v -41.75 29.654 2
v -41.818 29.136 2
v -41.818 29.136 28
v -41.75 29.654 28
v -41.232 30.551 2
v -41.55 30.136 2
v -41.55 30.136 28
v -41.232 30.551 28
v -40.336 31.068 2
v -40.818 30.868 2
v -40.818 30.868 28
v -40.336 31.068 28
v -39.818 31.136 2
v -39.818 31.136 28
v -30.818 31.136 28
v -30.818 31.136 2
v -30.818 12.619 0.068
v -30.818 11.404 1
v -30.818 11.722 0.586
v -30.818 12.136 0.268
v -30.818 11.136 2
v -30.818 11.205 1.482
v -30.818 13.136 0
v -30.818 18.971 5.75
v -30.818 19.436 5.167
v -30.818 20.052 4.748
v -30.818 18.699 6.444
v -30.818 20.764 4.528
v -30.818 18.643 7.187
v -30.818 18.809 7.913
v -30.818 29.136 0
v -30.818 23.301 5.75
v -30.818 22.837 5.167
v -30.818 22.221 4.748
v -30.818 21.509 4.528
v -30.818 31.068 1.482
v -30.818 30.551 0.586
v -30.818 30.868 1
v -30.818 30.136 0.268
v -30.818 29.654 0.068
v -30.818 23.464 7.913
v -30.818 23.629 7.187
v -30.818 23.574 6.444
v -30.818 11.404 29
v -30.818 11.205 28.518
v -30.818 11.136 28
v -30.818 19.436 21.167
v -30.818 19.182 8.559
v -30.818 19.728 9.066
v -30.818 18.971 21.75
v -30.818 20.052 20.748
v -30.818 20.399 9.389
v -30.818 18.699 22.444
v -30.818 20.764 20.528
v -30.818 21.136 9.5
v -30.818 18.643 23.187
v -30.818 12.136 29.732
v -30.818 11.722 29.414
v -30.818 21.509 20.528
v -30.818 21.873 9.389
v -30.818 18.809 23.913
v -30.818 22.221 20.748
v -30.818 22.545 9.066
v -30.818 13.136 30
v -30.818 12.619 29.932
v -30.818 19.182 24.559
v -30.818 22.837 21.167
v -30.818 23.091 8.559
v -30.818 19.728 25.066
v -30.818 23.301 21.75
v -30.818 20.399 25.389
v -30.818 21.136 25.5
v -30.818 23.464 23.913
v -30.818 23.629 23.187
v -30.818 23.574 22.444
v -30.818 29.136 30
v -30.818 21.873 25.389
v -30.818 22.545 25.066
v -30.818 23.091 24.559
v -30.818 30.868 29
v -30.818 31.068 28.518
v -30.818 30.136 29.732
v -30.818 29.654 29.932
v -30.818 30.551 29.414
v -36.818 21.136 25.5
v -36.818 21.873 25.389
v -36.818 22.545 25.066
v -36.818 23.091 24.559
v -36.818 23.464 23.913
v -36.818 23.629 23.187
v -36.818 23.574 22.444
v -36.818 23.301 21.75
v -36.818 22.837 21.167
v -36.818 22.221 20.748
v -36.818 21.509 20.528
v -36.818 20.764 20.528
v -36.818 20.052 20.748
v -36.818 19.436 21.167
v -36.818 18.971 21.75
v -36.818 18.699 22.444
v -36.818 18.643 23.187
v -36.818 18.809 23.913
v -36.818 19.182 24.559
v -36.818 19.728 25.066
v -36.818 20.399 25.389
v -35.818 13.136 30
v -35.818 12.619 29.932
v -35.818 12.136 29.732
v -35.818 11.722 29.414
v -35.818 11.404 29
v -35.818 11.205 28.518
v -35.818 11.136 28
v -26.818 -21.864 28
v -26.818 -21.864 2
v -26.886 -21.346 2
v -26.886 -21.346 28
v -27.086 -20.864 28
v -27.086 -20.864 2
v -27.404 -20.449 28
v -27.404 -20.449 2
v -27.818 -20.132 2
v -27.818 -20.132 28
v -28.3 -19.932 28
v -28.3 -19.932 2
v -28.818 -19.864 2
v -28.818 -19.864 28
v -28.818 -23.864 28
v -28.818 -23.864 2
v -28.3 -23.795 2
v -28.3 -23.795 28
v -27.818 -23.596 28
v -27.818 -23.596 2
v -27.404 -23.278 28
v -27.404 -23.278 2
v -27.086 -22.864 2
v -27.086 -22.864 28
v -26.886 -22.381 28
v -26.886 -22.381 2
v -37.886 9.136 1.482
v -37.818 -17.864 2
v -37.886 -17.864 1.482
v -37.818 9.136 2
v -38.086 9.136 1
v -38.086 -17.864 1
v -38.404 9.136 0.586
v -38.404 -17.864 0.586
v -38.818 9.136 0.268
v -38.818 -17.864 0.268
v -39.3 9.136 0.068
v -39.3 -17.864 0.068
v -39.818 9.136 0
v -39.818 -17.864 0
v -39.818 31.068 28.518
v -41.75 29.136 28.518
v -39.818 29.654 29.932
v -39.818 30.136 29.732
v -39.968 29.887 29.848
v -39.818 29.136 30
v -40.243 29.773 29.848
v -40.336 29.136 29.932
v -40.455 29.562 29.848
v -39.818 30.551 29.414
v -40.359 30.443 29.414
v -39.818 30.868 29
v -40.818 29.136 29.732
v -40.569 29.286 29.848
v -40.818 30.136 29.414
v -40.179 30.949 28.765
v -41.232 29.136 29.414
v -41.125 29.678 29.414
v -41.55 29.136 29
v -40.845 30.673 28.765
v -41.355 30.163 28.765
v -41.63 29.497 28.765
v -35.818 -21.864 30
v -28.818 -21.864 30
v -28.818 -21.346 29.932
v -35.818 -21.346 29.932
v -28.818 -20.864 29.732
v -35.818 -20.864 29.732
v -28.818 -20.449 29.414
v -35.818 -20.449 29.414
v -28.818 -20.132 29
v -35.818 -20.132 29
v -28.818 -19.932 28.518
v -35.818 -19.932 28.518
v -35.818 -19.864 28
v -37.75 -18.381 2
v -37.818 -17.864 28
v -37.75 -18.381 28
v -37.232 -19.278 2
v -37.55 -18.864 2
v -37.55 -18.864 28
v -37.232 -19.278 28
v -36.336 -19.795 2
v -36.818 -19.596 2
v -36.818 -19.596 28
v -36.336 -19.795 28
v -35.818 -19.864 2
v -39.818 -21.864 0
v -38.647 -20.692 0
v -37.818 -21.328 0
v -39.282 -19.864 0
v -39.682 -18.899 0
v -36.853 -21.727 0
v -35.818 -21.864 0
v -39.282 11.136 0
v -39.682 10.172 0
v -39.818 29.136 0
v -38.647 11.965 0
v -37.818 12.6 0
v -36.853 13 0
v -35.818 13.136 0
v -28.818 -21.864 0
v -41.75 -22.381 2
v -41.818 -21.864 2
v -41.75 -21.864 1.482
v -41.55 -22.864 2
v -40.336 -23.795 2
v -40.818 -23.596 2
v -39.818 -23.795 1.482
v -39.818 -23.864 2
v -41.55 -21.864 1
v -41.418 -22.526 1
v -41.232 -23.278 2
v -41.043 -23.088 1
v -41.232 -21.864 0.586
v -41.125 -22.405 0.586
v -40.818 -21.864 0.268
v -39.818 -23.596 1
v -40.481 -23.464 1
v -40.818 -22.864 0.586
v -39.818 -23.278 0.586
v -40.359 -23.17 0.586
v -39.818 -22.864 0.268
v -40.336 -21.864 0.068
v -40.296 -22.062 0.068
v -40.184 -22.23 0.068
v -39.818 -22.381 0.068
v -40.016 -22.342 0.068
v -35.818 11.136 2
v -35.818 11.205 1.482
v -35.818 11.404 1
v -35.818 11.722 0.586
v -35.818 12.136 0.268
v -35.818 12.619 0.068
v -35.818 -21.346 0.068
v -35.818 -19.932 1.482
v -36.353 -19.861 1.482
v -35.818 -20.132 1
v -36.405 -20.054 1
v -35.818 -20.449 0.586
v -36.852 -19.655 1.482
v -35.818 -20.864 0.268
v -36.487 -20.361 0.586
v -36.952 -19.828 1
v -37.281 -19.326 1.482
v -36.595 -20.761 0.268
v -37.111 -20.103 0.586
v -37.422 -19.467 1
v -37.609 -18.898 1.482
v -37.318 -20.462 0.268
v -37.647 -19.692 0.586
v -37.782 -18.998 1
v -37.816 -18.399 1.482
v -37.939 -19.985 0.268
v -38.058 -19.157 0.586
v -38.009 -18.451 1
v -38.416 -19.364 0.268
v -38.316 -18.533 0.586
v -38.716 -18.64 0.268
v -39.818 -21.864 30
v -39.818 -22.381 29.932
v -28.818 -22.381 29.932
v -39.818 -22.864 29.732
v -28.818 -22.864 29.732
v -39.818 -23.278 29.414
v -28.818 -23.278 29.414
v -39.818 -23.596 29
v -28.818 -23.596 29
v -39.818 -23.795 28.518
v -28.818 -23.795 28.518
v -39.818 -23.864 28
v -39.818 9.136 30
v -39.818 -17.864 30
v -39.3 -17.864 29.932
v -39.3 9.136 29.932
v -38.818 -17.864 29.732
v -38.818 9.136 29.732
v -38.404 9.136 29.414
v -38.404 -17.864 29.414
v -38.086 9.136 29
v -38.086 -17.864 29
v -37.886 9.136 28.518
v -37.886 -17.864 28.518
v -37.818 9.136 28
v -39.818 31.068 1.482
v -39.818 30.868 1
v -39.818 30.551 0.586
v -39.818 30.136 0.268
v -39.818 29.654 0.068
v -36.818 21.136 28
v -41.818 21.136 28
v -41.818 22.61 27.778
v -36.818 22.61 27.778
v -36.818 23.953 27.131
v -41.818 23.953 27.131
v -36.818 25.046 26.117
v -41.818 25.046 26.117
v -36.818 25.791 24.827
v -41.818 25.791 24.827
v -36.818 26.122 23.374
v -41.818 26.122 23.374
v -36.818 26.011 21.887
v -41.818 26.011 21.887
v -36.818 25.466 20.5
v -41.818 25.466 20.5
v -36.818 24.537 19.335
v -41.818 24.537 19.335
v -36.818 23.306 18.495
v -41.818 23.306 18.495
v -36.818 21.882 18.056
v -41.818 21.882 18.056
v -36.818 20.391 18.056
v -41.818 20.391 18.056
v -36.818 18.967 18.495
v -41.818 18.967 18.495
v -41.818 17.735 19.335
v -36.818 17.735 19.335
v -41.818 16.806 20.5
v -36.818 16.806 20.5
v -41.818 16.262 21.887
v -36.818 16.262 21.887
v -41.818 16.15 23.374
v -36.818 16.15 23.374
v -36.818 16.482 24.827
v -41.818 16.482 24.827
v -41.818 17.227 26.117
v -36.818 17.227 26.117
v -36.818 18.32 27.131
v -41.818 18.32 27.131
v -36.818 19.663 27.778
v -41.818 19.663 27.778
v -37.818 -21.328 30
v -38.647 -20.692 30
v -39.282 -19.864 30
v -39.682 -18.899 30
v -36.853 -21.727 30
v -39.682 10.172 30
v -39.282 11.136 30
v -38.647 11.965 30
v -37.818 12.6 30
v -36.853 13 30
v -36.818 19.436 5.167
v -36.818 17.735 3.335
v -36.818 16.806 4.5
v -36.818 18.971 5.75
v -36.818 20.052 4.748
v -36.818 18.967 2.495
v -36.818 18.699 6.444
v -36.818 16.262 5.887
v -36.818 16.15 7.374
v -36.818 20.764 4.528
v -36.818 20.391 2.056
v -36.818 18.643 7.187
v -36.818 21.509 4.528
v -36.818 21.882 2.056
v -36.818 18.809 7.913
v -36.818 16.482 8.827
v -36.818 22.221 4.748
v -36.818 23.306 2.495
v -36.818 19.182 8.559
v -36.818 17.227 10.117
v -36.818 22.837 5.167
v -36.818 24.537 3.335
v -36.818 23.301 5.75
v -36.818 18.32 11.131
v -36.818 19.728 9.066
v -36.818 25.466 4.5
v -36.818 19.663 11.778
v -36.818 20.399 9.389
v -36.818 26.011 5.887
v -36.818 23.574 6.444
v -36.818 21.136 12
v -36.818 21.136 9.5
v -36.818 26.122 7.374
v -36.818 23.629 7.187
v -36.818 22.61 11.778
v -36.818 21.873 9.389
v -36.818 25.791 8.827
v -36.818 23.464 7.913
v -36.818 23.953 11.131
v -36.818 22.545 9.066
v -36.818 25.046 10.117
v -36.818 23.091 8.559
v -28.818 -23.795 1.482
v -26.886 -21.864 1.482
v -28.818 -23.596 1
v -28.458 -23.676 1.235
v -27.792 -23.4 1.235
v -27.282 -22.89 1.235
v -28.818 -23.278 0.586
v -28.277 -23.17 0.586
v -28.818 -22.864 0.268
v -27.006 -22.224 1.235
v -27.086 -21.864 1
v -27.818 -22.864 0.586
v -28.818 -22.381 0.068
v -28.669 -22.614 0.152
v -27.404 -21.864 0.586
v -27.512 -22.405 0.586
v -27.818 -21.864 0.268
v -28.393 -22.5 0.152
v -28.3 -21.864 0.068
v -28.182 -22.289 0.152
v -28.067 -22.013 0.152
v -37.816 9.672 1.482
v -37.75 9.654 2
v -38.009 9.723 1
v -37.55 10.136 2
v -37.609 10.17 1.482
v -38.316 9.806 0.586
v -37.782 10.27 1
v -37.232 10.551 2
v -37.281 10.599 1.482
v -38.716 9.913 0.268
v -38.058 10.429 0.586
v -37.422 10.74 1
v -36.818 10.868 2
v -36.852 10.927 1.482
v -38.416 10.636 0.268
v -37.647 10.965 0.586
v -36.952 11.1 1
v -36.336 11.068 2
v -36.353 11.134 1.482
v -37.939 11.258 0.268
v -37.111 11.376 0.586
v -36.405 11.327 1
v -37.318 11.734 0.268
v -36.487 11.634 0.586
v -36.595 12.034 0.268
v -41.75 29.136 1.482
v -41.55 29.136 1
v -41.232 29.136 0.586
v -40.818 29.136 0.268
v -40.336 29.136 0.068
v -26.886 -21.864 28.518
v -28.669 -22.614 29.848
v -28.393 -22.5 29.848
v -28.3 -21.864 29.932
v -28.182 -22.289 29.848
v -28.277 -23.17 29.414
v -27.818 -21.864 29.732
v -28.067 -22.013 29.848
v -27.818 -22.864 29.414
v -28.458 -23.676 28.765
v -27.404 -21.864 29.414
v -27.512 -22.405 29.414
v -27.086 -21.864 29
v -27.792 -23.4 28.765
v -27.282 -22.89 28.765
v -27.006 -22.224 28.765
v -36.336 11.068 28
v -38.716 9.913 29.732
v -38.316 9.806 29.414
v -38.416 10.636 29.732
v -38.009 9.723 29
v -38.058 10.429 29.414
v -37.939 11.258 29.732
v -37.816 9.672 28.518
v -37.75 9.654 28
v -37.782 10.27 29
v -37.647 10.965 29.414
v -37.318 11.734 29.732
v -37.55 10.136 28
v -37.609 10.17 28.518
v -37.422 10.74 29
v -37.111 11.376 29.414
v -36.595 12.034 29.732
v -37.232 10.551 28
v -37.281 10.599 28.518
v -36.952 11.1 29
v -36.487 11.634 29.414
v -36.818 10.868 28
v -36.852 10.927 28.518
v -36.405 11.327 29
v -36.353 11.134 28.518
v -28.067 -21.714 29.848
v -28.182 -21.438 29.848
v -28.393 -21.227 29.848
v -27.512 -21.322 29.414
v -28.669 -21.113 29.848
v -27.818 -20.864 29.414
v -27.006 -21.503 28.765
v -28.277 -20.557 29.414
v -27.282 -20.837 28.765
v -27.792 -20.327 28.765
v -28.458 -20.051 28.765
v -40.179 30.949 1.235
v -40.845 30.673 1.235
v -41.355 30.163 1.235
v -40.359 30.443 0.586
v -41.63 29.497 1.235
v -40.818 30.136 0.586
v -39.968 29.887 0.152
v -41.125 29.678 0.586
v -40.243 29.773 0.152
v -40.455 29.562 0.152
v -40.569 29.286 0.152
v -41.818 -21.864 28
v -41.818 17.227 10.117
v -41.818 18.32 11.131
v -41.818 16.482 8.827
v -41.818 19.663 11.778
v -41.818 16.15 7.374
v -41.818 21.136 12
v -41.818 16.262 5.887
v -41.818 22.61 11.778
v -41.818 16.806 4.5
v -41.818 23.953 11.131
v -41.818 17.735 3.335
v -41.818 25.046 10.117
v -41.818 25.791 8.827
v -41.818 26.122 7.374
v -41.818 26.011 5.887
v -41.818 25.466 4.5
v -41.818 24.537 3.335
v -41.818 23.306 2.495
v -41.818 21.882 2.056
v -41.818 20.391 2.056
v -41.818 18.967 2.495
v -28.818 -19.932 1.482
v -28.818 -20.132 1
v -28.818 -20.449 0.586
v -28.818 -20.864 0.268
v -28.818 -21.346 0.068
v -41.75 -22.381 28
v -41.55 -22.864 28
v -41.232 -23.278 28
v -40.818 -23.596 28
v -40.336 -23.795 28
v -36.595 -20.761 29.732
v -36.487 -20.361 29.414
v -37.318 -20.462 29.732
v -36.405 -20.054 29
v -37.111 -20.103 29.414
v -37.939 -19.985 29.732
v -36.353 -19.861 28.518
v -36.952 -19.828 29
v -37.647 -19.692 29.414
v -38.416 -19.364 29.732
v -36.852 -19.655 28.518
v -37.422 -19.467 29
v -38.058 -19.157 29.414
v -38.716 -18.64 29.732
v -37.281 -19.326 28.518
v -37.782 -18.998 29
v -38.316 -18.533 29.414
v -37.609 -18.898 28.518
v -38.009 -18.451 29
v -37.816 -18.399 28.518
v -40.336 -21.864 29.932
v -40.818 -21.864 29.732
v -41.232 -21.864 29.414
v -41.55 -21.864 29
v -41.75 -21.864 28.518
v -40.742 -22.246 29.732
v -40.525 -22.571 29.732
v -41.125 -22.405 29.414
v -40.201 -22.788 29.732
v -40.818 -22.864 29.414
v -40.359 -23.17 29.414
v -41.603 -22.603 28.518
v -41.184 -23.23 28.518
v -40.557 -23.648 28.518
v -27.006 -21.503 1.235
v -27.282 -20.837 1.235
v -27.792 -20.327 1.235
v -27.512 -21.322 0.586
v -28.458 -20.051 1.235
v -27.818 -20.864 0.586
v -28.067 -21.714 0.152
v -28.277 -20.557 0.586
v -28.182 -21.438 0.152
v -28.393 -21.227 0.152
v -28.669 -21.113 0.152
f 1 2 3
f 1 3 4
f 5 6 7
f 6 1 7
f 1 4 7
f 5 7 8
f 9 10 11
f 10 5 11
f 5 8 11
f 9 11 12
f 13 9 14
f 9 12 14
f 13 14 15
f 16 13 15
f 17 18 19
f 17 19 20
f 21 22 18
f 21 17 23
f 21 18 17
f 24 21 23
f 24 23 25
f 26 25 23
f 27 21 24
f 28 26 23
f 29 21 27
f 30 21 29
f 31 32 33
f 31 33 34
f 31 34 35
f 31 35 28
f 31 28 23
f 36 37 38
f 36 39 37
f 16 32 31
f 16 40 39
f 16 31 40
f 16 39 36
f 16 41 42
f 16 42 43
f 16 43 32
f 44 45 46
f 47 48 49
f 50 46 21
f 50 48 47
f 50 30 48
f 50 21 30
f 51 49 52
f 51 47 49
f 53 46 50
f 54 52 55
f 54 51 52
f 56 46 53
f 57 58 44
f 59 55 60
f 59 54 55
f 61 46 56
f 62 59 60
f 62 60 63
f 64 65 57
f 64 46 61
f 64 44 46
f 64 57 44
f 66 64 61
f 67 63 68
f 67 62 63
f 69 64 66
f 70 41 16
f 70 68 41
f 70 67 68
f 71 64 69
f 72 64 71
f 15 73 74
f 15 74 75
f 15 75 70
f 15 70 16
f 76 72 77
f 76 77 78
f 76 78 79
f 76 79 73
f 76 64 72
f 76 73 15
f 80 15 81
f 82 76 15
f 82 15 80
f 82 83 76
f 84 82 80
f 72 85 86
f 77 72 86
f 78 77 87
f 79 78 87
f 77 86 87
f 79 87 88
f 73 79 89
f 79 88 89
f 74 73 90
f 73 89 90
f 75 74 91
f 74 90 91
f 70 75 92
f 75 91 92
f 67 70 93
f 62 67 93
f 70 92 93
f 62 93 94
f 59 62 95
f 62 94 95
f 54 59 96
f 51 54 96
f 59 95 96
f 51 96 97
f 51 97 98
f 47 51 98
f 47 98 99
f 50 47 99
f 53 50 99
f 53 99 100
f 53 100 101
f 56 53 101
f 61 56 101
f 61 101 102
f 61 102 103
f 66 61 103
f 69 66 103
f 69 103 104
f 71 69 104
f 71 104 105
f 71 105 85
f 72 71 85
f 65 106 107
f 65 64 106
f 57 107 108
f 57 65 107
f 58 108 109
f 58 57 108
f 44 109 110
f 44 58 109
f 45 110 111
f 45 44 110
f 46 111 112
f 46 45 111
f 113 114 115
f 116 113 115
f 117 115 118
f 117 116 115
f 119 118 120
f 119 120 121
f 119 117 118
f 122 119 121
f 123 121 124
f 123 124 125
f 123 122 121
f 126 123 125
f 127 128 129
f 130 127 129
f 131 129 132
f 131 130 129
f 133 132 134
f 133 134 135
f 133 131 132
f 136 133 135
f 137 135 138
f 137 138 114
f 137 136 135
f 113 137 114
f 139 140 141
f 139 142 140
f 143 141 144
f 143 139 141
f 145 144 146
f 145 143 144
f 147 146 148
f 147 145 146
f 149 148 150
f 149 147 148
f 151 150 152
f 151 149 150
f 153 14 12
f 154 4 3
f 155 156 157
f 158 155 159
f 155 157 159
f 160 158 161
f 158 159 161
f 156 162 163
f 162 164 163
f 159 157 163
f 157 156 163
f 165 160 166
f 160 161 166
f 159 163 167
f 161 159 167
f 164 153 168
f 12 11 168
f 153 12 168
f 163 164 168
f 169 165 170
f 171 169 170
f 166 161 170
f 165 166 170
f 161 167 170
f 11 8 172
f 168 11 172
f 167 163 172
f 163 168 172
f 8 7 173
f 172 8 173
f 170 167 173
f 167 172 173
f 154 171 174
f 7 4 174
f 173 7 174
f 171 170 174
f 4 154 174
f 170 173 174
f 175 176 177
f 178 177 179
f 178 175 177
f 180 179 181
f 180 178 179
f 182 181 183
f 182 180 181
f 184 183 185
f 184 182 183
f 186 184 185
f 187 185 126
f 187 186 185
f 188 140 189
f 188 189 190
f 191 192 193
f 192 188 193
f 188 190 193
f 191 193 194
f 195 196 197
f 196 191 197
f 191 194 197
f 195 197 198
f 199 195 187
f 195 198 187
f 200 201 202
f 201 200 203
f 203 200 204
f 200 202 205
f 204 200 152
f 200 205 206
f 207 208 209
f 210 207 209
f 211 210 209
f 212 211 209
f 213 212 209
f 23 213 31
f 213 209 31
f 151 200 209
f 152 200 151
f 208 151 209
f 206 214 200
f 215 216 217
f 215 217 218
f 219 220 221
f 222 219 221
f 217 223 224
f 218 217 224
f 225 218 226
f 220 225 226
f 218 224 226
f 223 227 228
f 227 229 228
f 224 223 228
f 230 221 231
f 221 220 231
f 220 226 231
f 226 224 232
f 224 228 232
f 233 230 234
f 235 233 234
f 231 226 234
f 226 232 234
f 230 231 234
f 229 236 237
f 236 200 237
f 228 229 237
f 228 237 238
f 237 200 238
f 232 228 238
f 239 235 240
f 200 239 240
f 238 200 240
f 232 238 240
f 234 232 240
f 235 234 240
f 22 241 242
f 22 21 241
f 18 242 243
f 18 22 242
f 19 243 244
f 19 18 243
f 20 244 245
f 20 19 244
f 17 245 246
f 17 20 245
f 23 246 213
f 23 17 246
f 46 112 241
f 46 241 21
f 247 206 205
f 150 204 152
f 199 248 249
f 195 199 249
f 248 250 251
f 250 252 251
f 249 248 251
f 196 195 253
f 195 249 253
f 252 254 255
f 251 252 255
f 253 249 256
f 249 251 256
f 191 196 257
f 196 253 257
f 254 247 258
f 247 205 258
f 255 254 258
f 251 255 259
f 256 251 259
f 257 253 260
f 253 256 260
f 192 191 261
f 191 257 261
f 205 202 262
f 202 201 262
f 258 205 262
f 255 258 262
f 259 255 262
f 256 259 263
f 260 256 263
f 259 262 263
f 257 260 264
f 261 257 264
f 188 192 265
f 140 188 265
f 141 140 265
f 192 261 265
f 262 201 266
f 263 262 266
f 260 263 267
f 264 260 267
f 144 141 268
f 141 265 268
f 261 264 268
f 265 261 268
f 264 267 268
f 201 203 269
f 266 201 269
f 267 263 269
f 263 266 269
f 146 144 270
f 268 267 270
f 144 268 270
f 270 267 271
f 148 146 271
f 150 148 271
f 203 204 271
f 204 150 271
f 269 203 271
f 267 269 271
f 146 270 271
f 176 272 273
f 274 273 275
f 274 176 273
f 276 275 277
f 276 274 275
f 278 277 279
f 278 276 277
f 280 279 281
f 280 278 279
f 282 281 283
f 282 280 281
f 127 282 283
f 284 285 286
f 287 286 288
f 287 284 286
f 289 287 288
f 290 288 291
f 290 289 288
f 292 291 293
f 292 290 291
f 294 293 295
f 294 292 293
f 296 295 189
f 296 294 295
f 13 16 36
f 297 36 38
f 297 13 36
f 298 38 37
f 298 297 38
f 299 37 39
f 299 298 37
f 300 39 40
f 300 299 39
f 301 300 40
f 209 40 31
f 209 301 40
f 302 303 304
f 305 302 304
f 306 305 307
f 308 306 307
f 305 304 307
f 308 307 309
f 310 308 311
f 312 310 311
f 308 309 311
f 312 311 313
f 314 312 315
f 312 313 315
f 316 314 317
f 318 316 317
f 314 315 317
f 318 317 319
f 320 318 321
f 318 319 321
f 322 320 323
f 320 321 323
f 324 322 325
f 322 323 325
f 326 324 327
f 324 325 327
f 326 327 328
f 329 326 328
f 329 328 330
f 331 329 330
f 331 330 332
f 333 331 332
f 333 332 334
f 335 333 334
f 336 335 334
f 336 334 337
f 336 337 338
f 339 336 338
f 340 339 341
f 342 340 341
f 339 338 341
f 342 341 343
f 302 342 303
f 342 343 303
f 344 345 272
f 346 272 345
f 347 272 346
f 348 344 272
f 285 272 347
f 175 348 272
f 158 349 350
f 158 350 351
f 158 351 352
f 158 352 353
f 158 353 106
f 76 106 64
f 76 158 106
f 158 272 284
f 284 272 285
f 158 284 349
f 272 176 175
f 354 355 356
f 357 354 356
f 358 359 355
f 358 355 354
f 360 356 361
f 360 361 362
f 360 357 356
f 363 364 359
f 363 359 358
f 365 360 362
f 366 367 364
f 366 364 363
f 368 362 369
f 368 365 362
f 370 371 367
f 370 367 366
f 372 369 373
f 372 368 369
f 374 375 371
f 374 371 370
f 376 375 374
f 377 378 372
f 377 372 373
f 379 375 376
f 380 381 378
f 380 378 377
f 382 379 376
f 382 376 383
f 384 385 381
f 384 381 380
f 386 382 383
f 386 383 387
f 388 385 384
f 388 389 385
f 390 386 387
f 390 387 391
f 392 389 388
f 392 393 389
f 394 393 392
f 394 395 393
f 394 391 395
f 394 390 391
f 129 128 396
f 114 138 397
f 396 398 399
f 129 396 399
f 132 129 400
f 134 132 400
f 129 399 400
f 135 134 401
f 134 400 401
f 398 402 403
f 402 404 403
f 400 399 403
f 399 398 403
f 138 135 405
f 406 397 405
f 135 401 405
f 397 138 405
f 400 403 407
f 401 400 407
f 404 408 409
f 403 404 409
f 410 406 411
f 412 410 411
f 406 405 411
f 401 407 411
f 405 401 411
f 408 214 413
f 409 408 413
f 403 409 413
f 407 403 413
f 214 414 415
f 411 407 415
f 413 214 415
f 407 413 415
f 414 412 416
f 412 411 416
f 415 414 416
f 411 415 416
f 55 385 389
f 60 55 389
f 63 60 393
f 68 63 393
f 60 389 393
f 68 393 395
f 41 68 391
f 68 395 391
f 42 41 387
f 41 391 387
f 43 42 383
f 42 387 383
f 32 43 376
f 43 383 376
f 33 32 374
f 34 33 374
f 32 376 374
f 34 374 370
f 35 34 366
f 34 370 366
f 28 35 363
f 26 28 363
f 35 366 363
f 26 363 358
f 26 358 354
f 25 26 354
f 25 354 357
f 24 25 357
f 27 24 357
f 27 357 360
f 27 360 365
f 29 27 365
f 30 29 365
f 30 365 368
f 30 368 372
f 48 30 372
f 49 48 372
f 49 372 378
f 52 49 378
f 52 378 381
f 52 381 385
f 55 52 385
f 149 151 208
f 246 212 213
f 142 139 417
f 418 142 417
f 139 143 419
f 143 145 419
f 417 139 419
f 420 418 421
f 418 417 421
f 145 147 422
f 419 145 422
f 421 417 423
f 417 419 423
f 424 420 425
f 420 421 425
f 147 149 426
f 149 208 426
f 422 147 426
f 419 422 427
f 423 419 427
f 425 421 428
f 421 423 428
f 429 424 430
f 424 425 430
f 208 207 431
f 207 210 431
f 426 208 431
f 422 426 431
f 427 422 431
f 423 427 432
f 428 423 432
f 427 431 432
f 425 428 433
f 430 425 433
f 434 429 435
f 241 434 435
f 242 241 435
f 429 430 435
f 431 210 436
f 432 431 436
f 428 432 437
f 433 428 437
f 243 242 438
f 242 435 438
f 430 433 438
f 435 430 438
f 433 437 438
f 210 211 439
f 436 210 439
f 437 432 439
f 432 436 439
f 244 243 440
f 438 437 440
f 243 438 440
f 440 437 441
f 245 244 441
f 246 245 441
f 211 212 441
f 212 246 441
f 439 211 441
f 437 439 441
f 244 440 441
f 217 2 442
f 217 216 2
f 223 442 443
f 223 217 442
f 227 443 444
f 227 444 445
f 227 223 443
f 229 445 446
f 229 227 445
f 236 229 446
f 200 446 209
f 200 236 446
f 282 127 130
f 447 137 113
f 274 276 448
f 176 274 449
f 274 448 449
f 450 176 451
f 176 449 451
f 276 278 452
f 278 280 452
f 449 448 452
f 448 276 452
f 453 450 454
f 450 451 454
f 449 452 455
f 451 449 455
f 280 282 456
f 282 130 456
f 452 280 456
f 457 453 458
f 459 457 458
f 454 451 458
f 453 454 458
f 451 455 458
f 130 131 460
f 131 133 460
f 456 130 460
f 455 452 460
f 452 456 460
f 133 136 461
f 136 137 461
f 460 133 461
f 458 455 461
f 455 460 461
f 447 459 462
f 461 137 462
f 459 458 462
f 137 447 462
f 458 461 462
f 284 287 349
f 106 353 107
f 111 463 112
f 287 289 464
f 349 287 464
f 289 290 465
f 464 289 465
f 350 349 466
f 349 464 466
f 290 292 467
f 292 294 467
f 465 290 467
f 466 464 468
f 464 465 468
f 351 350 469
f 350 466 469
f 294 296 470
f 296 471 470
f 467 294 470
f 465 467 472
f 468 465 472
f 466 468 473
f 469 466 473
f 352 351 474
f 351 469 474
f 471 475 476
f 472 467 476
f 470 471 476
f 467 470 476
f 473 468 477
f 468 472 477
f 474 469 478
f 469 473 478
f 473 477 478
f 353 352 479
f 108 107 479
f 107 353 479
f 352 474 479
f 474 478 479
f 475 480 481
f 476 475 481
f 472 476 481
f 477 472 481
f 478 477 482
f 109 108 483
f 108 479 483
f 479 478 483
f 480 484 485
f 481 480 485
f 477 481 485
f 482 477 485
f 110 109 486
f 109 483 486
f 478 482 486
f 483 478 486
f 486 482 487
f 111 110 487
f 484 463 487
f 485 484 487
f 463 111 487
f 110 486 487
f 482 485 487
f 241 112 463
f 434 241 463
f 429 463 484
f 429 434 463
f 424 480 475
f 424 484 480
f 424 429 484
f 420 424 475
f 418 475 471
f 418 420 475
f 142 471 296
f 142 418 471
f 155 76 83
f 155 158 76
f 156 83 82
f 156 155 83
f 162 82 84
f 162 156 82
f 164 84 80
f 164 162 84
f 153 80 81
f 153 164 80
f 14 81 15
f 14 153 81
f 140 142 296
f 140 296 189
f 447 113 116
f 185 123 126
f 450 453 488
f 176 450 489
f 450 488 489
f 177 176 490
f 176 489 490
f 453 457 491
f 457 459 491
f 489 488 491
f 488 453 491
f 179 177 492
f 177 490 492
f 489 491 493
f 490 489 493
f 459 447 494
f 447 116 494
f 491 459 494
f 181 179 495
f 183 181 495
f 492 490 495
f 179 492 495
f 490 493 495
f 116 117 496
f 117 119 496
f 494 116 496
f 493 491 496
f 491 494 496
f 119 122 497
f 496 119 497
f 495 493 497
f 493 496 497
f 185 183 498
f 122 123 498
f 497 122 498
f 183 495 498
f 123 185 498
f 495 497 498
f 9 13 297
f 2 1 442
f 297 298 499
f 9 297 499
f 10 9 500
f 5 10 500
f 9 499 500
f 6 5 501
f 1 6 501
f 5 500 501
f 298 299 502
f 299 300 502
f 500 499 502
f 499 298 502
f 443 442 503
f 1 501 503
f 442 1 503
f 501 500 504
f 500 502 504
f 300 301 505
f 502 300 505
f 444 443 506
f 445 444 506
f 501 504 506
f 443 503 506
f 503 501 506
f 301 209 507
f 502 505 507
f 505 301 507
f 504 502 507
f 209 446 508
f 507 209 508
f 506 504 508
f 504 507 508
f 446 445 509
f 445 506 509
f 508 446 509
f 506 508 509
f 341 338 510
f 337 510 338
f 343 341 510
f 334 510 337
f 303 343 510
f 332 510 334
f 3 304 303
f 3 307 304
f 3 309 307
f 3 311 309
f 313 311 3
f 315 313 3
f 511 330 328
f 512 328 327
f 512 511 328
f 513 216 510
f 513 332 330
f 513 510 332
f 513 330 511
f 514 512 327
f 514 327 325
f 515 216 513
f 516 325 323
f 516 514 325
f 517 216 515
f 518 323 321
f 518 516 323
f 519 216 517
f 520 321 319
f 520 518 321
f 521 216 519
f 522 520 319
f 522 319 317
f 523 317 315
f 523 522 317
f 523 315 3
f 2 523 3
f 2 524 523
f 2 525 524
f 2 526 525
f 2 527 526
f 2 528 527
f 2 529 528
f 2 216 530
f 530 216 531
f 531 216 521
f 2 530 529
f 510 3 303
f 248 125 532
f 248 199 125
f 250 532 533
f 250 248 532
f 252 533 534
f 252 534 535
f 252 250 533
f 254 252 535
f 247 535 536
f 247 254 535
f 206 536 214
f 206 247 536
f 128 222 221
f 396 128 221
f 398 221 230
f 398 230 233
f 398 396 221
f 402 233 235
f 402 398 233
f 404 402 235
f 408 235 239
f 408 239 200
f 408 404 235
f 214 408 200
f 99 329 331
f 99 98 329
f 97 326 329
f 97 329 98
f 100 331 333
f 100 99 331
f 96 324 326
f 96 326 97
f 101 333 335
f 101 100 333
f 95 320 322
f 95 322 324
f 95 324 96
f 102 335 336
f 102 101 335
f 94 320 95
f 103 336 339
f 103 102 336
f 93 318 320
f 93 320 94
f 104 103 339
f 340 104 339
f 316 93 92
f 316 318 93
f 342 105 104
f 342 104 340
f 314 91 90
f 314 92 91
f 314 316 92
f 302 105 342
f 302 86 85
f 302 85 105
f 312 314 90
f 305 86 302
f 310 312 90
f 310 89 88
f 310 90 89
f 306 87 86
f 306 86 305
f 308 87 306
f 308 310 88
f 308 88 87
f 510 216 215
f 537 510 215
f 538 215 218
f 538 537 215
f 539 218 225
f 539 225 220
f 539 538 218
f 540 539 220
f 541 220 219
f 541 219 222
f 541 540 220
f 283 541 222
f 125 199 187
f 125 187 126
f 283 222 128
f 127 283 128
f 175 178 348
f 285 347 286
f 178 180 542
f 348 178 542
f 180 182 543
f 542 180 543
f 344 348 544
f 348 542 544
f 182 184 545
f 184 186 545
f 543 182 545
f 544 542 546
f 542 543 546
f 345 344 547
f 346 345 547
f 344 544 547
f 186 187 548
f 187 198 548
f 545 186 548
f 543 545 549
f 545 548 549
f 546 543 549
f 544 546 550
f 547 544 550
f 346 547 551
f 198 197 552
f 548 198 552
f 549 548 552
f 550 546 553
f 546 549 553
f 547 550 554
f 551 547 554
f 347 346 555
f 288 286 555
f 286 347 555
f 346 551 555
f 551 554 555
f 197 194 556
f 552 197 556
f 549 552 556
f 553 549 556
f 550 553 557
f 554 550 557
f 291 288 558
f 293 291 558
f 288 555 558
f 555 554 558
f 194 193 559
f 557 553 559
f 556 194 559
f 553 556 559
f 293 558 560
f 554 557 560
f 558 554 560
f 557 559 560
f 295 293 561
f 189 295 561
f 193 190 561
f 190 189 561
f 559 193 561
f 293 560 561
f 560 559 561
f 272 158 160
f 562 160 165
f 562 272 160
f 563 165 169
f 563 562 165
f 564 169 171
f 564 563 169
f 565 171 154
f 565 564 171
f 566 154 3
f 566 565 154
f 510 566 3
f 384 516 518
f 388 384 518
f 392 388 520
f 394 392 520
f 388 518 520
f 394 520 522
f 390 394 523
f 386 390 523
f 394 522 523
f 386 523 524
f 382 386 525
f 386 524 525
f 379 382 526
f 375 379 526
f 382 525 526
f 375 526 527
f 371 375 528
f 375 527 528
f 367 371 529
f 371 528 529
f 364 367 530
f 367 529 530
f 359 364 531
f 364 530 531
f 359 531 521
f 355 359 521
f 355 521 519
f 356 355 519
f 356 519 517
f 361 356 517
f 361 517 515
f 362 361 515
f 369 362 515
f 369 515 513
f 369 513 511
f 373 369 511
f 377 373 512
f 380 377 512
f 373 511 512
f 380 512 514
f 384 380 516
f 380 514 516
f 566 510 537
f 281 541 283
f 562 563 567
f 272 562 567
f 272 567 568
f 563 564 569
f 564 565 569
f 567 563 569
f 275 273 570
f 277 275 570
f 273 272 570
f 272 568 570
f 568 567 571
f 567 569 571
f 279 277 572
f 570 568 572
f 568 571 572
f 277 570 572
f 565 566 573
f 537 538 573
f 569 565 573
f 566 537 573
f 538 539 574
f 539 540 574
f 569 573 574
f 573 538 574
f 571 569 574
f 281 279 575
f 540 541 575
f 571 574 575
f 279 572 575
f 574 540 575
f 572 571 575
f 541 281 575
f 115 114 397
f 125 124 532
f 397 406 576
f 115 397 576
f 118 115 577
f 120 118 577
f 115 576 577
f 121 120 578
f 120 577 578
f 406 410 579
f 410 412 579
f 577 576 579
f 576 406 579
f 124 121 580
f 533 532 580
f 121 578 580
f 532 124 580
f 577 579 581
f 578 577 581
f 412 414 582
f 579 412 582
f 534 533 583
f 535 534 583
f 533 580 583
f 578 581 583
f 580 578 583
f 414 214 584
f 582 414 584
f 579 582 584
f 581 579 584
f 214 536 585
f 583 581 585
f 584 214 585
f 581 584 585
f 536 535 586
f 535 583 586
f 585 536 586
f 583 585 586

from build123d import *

# Parameters (mm, degrees)
EXTRUDE_1_DEPTH     = 30
SKETCH_3_W          = 7
SKETCH_3_H          = 20
EXTRUDE_2_DEPTH     = 30
SKETCH_2_R          = 2.5
CUT_EXTRUDE_1_DEPTH = 30
FILLET_1_R          = 2
FILLET_2_R          = 2
FILLET_3_R          = 2
FILLET_5_R          = 2
SKETCH_4_R          = 5
CUT_EXTRUDE_2_DEPTH = 5


with BuildPart() as part:
    # 스케치1 → 보스-돌출1 (new body)
    with BuildSketch(Plane.XY):
        Polygon((-41.818181818, 31.136363636), (-37.818181818, 31.136363636), (-37.818181818, -19.863636364), (-26.818181818, -19.863636364), (-26.818181818, -23.863636364), (-32.727272727, -23.863636364), (-41.818181818, -23.863636364), align=None)
    extrude(amount=EXTRUDE_1_DEPTH)

    # 스케치3 → 보스-돌출2 (add)
    with BuildSketch(Plane.XY.offset(30)):
        with Locations((-34.318181818, 21.136363636)):
            Rectangle(SKETCH_3_W, SKETCH_3_H)
    extrude(amount=-EXTRUDE_2_DEPTH)

    # 스케치2 → 컷-돌출1 (cut)
    with BuildSketch(Plane.ZY.offset(41.818181818)):
        with Locations((7, 21.136363636)):
            Circle(SKETCH_2_R)
        with Locations((23, 21.136363636)):
            Circle(SKETCH_2_R)
    extrude(amount=-CUT_EXTRUDE_1_DEPTH, mode=Mode.SUBTRACT)

    # 필렛1
    fillet_1_edges = [part.edges().sort_by_distance(p)[0] for p in [
        (-37.818181818, -19.863636364, 15),
        (-37.818181818, 11.136363636, 15),
    ]]
    fillet(fillet_1_edges, radius=FILLET_1_R)

    # 필렛2
    fillet_2_edges = [part.edges().sort_by_distance(p)[0] for p in [
        (-41.818181818, -23.863636364, 15),
    ]]
    fillet(fillet_2_edges, radius=FILLET_2_R)

    # 필렛3
    fillet_3_edges = [part.edges().sort_by_distance(p)[0] for p in [
        (-26.818181818, -23.863636364, 15),
        (-26.818181818, -19.863636364, 15),
        (-41.818181818, 31.136363636, 15),
    ]]
    fillet(fillet_3_edges, radius=FILLET_3_R - 0.0001)  # a hair under: the kernel refuses the full size

    # 필렛5
    fillet_5_edges = [part.edges().sort_by_distance(p)[0] for p in [
        (-35.318231818, 31.136363636, 30),
        (-33.318181818, 11.136363636, 0),
        (-37.818181818, -4.363636364, 0),
        (-37.818181818, -4.363636364, 30),
        (-33.318181818, 11.136363636, 30),
        (-37.232395381, 10.550577199, 30),
        (-37.232395381, 10.550577199, 0),
        (-37.232395381, -19.277849926, 0),
        (-37.232395381, -19.277849926, 30),
        (-34.318131818, -23.863636364, 0),
        (-34.318131818, -23.863636364, 30),
        (-41.232395381, -23.277849926, 0),
        (-41.232395381, -23.277849926, 30),
        (-41.818181818, 3.636413636, 0),
        (-32.318131818, -19.863636364, 0),
        (-41.23242467, 30.550606488, 0),
        (-27.403938966, -20.449393512, 0),
        (-27.403938966, -23.277879215, 0),
        (-41.818181818, 3.636413636, 30),
        (-35.318231818, 31.136363636, 0),
        (-32.318131818, -19.863636364, 30),
        (-41.23242467, 30.550606488, 30),
        (-27.403938966, -20.449393512, 30),
        (-27.403938966, -23.277879215, 30),
    ]]
    fillet(fillet_5_edges, radius=FILLET_5_R - 0.0001)  # a hair under: the kernel refuses the full size

    # 스케치4 → 컷-돌출2 (cut)
    with BuildSketch(Plane.ZY.offset(41.818181818)):
        with Locations((7, 21.136363636)):
            Circle(SKETCH_4_R)
        with Locations((23, 21.136363636)):
            Circle(SKETCH_4_R)
    extrude(amount=-CUT_EXTRUDE_2_DEPTH, mode=Mode.SUBTRACT)


solid = part.part
